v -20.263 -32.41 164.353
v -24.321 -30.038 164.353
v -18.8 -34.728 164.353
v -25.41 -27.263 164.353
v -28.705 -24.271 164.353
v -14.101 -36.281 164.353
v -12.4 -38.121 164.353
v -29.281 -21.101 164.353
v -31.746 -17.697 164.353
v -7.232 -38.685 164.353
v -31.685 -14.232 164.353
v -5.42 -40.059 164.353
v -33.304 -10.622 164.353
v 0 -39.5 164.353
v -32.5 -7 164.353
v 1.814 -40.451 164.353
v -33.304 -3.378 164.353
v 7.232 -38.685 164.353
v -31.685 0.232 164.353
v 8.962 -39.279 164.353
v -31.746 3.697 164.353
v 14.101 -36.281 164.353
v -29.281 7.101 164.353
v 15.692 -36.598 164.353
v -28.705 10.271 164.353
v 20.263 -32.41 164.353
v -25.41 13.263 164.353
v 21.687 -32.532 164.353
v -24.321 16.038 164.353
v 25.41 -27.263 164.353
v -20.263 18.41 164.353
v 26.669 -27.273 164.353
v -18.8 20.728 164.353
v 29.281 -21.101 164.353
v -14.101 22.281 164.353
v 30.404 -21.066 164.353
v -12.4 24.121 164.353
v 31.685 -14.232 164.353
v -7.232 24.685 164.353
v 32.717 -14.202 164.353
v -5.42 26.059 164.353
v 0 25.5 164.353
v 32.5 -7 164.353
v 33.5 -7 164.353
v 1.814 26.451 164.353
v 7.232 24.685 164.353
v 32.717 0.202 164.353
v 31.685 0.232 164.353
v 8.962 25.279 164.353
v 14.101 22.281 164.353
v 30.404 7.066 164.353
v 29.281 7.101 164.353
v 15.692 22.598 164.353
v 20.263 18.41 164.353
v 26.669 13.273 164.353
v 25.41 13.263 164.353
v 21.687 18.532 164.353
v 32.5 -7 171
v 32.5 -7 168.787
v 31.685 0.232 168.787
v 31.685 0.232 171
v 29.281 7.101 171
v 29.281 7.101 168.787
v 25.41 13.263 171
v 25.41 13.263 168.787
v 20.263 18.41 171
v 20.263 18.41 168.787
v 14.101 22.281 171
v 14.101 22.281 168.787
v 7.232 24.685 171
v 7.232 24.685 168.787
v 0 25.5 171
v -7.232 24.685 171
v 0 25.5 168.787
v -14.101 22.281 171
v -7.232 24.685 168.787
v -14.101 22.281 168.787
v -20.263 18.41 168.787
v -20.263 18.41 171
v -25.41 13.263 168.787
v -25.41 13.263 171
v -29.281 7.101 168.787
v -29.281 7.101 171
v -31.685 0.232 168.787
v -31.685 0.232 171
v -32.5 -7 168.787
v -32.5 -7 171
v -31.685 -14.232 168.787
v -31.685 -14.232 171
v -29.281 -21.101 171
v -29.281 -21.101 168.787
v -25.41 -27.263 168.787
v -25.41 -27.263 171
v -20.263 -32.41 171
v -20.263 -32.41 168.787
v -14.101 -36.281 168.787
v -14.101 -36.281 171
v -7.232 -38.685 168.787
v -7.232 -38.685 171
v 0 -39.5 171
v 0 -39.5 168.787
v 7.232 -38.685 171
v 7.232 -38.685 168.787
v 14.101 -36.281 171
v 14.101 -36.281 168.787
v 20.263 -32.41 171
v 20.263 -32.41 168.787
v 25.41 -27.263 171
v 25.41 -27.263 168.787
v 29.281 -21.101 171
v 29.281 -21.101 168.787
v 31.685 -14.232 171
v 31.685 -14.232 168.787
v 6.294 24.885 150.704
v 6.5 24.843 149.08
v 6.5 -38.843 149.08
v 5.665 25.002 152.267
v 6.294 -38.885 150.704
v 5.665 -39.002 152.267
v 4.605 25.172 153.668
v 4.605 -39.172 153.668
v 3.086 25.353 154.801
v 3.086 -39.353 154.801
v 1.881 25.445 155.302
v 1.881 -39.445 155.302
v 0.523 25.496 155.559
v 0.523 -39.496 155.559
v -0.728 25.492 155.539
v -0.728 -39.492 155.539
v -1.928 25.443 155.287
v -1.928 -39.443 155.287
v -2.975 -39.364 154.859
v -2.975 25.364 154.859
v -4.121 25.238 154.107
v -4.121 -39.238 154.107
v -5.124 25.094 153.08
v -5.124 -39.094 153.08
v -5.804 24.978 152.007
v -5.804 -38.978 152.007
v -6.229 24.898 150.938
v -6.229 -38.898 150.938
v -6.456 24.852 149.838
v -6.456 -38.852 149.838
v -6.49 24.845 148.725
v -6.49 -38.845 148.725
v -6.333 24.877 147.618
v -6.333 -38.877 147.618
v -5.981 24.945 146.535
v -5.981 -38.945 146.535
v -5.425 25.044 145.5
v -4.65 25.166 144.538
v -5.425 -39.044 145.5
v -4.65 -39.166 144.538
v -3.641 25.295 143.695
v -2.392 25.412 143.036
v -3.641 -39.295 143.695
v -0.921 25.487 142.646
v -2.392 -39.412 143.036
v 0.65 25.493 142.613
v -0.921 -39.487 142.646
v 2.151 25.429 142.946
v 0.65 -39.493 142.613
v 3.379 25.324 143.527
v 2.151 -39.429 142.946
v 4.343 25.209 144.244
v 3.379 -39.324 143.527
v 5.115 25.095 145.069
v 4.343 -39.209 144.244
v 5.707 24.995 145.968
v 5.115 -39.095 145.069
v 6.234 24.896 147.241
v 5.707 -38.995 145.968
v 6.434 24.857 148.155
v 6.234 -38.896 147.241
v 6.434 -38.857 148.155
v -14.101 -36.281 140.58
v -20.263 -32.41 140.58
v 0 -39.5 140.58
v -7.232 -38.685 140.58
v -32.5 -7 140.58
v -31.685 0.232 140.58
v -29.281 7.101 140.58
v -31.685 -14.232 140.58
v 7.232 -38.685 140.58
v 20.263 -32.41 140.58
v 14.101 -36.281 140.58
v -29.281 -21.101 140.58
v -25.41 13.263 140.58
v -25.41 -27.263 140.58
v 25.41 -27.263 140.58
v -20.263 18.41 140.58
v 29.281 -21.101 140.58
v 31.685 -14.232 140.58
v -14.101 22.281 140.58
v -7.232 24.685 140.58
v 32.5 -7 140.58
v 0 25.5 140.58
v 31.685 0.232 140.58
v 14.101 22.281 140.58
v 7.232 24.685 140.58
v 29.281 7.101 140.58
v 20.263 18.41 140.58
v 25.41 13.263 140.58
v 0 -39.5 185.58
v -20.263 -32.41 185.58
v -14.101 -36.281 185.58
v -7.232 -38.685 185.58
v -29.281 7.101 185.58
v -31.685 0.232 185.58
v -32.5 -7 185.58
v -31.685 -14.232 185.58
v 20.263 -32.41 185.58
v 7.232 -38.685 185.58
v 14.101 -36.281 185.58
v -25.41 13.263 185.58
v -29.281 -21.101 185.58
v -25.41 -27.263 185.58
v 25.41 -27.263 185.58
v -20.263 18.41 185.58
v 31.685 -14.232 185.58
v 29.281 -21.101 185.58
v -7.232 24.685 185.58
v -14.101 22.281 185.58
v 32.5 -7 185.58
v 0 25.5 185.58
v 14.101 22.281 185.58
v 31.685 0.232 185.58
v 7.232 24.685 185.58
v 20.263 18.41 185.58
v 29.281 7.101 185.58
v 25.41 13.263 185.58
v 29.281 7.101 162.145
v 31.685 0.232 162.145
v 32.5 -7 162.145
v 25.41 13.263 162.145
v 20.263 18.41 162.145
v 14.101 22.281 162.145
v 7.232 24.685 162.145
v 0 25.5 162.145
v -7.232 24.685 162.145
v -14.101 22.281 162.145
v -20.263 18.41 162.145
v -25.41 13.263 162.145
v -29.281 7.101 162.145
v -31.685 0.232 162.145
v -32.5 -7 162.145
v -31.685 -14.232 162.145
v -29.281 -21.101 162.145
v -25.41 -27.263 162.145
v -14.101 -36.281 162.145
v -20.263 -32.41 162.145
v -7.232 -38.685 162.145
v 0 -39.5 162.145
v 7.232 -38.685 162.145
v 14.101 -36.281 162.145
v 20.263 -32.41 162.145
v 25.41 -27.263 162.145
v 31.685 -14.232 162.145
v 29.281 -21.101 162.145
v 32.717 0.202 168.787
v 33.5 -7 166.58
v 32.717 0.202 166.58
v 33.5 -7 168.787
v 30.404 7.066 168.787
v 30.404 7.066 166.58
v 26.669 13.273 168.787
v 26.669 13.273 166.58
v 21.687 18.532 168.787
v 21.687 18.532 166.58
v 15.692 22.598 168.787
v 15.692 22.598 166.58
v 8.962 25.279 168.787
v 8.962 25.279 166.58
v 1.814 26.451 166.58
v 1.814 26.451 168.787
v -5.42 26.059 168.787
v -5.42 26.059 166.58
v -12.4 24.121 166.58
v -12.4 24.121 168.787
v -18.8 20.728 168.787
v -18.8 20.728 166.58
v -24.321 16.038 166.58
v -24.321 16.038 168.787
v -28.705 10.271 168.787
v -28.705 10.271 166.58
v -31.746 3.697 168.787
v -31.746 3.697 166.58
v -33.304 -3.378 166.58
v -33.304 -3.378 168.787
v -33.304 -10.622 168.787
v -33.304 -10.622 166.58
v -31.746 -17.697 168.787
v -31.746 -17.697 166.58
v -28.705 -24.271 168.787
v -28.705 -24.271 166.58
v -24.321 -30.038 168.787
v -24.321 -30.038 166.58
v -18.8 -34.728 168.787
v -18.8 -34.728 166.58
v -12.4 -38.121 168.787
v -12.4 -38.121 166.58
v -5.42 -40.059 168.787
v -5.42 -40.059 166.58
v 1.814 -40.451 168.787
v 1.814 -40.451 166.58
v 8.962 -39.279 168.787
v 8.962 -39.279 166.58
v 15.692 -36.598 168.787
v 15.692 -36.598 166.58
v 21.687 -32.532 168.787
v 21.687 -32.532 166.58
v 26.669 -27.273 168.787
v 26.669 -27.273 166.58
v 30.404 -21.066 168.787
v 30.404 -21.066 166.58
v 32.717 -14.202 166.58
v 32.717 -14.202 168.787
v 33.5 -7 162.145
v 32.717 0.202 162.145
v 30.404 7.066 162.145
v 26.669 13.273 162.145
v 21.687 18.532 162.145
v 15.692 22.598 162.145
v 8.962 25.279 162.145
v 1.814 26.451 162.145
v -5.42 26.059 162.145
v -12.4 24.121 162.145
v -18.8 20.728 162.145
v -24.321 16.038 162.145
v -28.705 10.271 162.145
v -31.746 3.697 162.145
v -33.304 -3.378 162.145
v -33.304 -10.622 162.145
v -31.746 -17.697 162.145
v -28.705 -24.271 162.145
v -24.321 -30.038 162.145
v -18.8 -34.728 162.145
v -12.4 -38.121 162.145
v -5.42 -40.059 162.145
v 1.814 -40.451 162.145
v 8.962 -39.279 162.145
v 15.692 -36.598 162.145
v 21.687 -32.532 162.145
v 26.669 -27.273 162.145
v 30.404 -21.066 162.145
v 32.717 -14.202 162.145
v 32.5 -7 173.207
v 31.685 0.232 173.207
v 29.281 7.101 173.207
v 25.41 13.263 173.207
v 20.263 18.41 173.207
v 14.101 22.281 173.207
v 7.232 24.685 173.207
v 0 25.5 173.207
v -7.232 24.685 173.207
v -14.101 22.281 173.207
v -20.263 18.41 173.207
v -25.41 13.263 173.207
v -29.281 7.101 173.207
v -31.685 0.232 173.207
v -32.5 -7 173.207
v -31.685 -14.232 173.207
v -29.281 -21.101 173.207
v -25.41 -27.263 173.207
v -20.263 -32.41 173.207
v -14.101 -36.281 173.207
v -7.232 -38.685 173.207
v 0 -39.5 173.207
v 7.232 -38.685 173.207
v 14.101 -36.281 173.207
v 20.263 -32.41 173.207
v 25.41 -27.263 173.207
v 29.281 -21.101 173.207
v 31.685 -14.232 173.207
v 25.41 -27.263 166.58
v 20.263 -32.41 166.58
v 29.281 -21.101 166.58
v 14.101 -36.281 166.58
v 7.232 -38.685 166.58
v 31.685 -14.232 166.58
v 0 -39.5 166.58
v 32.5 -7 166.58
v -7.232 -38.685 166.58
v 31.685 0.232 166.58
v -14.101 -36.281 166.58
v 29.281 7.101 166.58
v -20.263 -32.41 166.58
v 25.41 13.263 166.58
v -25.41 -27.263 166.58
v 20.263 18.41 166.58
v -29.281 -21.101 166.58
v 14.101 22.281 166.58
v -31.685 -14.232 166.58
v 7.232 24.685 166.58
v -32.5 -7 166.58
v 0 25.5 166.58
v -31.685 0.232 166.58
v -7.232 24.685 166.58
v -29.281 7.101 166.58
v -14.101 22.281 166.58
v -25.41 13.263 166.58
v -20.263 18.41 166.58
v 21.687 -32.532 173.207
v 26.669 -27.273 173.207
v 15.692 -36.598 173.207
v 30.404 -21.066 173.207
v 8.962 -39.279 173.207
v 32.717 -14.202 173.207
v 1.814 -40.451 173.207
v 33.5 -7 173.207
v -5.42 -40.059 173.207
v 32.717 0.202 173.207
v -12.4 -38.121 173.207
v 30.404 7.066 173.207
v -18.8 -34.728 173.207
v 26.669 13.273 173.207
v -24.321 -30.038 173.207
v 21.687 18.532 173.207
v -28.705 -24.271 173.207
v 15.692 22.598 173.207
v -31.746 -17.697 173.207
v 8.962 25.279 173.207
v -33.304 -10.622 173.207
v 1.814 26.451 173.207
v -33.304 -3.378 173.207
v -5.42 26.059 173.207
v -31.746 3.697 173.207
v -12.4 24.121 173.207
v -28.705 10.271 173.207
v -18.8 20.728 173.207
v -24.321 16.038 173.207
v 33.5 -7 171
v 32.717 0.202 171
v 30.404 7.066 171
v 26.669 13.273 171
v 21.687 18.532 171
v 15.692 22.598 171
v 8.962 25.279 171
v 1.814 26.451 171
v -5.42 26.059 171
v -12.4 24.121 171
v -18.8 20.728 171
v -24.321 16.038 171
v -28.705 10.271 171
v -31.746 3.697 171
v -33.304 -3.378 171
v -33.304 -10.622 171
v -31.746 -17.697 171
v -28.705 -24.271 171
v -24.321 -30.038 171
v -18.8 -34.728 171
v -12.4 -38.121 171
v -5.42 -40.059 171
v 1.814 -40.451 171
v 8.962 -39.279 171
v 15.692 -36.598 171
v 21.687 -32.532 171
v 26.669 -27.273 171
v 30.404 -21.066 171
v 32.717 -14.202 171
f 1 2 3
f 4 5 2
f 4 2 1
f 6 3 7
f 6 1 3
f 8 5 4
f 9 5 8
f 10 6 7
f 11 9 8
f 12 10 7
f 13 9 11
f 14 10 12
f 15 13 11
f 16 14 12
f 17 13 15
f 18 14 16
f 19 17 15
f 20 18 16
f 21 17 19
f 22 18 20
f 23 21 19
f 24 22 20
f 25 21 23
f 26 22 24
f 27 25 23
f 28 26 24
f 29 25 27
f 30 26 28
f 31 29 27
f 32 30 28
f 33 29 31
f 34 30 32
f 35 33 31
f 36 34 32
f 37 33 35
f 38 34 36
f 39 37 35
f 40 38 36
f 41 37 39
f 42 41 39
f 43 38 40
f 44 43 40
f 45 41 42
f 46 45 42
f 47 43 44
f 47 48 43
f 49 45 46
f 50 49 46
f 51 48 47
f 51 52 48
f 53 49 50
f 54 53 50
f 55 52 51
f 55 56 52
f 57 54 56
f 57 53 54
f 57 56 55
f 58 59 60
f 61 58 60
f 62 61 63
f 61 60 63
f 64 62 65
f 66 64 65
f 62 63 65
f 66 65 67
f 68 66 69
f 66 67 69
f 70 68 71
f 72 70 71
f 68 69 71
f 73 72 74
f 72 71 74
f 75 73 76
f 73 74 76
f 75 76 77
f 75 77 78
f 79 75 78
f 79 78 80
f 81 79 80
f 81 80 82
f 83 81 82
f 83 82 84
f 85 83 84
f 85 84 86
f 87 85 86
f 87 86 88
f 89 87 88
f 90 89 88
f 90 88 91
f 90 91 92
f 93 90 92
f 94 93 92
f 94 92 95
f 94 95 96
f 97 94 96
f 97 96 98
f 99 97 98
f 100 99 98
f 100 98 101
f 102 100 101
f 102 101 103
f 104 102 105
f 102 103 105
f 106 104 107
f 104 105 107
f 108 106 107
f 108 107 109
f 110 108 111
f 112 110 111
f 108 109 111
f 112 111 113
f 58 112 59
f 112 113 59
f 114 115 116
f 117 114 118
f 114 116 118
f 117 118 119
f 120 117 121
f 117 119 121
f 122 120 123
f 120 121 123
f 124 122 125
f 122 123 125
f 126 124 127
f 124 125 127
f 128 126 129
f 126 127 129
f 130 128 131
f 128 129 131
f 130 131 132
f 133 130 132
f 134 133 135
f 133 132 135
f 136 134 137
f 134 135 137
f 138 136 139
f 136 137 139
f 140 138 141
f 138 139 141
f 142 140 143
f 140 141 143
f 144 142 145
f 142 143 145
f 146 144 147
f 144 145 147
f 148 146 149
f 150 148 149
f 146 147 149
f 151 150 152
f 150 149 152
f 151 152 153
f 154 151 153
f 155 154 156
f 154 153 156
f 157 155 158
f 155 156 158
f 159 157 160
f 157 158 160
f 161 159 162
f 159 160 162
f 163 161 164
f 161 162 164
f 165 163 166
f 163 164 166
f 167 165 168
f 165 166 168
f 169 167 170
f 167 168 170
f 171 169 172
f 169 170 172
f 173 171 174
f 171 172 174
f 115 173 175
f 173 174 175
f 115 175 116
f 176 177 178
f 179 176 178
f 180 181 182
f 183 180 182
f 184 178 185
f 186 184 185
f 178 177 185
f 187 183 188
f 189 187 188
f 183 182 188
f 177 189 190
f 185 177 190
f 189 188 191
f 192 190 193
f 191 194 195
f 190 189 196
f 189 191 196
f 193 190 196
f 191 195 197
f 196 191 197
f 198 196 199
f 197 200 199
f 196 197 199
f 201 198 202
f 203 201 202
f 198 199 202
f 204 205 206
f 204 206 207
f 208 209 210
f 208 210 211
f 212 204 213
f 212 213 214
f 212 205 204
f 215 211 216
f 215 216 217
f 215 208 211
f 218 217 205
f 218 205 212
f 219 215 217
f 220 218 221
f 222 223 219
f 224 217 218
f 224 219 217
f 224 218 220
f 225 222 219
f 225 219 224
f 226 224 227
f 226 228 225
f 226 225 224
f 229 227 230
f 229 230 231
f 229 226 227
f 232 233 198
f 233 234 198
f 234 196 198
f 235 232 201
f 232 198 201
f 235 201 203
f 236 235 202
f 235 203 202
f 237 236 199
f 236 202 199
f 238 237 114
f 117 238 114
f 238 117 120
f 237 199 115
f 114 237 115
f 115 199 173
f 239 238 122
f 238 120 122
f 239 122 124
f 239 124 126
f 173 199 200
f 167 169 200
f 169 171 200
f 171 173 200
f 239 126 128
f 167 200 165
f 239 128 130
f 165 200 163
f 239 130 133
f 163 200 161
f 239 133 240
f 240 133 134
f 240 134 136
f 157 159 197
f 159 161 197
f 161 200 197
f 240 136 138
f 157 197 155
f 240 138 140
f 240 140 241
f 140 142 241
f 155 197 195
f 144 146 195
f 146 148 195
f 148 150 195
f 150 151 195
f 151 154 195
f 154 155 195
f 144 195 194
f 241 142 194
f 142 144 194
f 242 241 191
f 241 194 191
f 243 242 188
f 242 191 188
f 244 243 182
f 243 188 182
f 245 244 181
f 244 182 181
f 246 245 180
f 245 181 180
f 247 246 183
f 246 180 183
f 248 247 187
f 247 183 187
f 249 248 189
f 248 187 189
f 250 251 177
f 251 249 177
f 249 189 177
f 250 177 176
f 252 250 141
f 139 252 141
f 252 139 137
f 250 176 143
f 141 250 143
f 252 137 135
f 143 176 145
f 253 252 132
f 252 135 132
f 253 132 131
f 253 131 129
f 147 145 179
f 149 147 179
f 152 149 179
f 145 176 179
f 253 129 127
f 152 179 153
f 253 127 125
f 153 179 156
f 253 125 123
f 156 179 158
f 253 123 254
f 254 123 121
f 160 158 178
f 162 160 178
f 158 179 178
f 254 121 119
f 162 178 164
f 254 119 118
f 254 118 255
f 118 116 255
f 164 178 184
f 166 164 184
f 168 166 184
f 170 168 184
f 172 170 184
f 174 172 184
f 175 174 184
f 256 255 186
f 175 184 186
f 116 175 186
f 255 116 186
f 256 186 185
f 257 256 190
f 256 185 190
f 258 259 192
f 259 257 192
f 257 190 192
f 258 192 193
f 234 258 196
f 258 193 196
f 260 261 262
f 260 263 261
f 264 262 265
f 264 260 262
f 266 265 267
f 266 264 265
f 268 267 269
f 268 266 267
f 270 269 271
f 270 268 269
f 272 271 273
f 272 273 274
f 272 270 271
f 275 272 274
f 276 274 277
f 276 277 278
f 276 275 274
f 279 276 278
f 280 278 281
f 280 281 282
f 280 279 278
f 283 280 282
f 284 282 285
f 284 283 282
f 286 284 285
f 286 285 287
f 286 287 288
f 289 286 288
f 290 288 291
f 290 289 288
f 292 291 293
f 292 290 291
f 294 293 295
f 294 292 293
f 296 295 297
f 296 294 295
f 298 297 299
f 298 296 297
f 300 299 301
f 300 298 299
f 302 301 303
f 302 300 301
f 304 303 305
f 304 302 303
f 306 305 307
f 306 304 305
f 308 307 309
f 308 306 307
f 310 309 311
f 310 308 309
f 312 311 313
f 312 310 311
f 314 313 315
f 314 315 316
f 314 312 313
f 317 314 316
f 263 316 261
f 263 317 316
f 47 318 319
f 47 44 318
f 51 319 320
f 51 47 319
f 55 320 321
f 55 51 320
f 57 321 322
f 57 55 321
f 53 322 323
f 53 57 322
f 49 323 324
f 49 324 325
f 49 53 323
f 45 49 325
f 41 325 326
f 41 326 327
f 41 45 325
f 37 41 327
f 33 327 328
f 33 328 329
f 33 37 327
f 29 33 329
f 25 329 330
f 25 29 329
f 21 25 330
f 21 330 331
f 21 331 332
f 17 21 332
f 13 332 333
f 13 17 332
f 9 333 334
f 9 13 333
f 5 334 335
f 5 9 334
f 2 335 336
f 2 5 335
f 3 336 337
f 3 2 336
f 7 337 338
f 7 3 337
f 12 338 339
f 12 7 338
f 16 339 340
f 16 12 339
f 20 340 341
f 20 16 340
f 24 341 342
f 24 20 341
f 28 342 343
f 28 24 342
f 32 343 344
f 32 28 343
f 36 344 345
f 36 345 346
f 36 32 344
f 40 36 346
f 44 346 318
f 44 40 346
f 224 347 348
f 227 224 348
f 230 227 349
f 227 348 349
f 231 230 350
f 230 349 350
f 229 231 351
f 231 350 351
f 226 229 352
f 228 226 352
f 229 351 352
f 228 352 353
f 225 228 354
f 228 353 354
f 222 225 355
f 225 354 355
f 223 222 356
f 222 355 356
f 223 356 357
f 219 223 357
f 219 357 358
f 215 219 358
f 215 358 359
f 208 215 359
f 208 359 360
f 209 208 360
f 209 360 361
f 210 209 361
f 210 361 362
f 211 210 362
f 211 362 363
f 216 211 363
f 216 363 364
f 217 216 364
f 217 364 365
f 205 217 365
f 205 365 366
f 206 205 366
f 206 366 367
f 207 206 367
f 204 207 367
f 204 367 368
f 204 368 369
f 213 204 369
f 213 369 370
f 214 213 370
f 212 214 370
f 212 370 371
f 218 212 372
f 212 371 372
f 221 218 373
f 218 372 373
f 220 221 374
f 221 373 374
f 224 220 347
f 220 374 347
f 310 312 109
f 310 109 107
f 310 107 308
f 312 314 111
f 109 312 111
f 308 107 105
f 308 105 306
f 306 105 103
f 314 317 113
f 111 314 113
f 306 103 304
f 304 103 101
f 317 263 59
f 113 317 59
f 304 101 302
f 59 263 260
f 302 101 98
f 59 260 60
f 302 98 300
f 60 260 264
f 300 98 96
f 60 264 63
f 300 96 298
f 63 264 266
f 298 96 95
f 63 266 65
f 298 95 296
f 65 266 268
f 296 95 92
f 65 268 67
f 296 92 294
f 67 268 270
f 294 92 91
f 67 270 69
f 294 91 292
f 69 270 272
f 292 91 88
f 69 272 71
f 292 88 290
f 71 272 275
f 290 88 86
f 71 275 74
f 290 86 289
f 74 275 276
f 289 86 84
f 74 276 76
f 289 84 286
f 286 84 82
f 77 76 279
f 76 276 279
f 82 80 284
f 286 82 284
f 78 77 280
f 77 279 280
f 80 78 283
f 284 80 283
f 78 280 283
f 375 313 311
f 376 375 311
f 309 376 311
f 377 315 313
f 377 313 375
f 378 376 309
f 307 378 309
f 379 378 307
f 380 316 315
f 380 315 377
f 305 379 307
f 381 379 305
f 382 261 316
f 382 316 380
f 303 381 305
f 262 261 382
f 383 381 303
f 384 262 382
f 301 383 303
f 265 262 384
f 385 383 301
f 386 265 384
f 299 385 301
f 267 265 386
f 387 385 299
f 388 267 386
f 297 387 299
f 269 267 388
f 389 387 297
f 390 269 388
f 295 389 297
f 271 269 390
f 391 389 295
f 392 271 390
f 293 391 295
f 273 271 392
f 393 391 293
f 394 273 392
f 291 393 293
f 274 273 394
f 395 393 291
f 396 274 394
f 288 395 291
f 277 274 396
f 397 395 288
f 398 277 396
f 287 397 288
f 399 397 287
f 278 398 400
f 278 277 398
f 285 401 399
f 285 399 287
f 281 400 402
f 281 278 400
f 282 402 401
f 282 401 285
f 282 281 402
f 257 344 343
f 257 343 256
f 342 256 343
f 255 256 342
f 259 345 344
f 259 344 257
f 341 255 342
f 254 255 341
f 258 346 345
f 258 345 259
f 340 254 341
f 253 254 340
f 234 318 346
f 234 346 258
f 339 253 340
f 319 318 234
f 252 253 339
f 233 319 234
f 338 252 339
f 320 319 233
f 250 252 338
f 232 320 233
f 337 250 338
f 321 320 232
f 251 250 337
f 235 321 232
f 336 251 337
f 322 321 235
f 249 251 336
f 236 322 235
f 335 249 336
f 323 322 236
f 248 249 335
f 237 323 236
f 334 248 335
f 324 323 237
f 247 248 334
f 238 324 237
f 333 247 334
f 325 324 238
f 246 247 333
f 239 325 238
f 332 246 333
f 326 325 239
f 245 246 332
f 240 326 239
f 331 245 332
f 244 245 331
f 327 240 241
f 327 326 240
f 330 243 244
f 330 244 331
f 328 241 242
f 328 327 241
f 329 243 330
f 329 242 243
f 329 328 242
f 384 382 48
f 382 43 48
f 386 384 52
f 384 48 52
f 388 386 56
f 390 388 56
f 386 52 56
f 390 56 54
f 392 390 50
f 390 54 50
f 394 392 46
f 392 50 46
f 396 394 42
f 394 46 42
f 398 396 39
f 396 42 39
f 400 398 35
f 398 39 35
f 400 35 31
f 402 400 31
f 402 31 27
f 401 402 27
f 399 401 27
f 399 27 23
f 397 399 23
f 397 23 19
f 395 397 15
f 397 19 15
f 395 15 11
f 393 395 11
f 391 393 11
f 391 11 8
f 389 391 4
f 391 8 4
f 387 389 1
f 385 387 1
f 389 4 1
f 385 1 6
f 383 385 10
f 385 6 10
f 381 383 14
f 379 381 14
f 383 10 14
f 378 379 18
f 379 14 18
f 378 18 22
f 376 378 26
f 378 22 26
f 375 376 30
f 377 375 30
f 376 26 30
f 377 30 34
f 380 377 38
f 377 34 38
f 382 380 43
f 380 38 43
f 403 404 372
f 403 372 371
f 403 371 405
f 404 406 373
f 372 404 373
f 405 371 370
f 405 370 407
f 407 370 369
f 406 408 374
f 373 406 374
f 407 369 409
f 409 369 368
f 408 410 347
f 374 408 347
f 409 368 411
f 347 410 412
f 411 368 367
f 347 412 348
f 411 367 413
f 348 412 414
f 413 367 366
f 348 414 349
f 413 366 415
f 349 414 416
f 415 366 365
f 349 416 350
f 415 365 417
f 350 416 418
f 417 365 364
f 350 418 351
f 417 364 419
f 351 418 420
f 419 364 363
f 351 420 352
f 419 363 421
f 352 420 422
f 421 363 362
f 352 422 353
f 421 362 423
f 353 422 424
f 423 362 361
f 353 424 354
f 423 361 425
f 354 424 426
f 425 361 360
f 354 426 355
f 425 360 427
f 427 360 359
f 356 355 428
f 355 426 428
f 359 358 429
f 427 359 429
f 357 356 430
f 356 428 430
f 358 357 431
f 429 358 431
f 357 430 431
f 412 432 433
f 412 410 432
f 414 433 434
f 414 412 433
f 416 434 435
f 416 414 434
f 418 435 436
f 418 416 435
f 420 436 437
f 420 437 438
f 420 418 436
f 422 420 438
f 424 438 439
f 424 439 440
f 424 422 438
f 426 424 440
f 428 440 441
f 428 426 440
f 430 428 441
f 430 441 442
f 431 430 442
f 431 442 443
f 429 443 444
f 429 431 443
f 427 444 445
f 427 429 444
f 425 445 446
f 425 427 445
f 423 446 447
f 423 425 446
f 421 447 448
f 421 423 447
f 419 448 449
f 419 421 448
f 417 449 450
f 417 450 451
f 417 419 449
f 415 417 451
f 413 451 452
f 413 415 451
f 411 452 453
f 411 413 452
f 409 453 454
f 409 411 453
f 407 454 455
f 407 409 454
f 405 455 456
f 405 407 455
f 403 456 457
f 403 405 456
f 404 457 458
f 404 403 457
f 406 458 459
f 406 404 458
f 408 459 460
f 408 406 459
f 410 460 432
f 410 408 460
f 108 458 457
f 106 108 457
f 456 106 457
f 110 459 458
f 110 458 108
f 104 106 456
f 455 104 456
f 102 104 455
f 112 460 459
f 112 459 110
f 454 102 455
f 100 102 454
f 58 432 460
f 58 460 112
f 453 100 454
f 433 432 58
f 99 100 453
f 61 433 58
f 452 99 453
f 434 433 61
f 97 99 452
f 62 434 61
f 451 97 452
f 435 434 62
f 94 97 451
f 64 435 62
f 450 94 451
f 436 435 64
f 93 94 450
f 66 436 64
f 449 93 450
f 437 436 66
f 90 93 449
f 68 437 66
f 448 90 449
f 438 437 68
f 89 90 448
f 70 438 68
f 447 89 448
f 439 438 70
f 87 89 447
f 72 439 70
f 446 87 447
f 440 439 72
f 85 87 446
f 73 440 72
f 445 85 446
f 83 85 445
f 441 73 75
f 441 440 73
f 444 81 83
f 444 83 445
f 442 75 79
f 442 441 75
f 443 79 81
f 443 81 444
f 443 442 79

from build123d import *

# Parameters (mm, degrees)
SKETCH010_R          = 32.5
PAD005_DEPTH         = 45
SKETCH011_R          = 6.5
POCKET006_DEPTH      = 32.501
POCKET006_DEPTH_BACK = 32.501
SKETCH013_W          = 1
SKETCH013_H          = 2.20711
SKETCH013_H_2        = 2.207111


with BuildPart() as part:
    # Sketch010 → Pad005 (new body)
    with BuildSketch(Plane.XY):
        Circle(SKETCH010_R)
    extrude(amount=PAD005_DEPTH)

    # Sketch011 → Pocket006 (cut, two sides)
    with BuildSketch(Plane.XZ) as pocket006_sk:
        with Locations((0, 8.5)):
            Circle(SKETCH011_R)
    extrude(amount=-POCKET006_DEPTH, mode=Mode.SUBTRACT)
    extrude(pocket006_sk.sketch, amount=POCKET006_DEPTH_BACK, mode=Mode.SUBTRACT)

    # Sketch013 → Revolution (revolve)
    with BuildSketch(Plane.XZ):
        Polygon((32.492016, 21.565427), (33.5, 21.565427), (33.5, 23.772537), (32.487373, 23.772537), align=None)
        with Locations((33, 27.103555)):
            Rectangle(SKETCH013_W, SKETCH013_H)
        with Locations((33, 31.523173)):
            Rectangle(SKETCH013_W, SKETCH013_H_2)
    revolve(axis=Axis((0, 0, 0), (0, 0, 1)))


with BuildPart() as part_1:
    # Body003 placement: moved
    add(part.part.moved(Location((0, -7, 140.58))))


solid = part_1.part
